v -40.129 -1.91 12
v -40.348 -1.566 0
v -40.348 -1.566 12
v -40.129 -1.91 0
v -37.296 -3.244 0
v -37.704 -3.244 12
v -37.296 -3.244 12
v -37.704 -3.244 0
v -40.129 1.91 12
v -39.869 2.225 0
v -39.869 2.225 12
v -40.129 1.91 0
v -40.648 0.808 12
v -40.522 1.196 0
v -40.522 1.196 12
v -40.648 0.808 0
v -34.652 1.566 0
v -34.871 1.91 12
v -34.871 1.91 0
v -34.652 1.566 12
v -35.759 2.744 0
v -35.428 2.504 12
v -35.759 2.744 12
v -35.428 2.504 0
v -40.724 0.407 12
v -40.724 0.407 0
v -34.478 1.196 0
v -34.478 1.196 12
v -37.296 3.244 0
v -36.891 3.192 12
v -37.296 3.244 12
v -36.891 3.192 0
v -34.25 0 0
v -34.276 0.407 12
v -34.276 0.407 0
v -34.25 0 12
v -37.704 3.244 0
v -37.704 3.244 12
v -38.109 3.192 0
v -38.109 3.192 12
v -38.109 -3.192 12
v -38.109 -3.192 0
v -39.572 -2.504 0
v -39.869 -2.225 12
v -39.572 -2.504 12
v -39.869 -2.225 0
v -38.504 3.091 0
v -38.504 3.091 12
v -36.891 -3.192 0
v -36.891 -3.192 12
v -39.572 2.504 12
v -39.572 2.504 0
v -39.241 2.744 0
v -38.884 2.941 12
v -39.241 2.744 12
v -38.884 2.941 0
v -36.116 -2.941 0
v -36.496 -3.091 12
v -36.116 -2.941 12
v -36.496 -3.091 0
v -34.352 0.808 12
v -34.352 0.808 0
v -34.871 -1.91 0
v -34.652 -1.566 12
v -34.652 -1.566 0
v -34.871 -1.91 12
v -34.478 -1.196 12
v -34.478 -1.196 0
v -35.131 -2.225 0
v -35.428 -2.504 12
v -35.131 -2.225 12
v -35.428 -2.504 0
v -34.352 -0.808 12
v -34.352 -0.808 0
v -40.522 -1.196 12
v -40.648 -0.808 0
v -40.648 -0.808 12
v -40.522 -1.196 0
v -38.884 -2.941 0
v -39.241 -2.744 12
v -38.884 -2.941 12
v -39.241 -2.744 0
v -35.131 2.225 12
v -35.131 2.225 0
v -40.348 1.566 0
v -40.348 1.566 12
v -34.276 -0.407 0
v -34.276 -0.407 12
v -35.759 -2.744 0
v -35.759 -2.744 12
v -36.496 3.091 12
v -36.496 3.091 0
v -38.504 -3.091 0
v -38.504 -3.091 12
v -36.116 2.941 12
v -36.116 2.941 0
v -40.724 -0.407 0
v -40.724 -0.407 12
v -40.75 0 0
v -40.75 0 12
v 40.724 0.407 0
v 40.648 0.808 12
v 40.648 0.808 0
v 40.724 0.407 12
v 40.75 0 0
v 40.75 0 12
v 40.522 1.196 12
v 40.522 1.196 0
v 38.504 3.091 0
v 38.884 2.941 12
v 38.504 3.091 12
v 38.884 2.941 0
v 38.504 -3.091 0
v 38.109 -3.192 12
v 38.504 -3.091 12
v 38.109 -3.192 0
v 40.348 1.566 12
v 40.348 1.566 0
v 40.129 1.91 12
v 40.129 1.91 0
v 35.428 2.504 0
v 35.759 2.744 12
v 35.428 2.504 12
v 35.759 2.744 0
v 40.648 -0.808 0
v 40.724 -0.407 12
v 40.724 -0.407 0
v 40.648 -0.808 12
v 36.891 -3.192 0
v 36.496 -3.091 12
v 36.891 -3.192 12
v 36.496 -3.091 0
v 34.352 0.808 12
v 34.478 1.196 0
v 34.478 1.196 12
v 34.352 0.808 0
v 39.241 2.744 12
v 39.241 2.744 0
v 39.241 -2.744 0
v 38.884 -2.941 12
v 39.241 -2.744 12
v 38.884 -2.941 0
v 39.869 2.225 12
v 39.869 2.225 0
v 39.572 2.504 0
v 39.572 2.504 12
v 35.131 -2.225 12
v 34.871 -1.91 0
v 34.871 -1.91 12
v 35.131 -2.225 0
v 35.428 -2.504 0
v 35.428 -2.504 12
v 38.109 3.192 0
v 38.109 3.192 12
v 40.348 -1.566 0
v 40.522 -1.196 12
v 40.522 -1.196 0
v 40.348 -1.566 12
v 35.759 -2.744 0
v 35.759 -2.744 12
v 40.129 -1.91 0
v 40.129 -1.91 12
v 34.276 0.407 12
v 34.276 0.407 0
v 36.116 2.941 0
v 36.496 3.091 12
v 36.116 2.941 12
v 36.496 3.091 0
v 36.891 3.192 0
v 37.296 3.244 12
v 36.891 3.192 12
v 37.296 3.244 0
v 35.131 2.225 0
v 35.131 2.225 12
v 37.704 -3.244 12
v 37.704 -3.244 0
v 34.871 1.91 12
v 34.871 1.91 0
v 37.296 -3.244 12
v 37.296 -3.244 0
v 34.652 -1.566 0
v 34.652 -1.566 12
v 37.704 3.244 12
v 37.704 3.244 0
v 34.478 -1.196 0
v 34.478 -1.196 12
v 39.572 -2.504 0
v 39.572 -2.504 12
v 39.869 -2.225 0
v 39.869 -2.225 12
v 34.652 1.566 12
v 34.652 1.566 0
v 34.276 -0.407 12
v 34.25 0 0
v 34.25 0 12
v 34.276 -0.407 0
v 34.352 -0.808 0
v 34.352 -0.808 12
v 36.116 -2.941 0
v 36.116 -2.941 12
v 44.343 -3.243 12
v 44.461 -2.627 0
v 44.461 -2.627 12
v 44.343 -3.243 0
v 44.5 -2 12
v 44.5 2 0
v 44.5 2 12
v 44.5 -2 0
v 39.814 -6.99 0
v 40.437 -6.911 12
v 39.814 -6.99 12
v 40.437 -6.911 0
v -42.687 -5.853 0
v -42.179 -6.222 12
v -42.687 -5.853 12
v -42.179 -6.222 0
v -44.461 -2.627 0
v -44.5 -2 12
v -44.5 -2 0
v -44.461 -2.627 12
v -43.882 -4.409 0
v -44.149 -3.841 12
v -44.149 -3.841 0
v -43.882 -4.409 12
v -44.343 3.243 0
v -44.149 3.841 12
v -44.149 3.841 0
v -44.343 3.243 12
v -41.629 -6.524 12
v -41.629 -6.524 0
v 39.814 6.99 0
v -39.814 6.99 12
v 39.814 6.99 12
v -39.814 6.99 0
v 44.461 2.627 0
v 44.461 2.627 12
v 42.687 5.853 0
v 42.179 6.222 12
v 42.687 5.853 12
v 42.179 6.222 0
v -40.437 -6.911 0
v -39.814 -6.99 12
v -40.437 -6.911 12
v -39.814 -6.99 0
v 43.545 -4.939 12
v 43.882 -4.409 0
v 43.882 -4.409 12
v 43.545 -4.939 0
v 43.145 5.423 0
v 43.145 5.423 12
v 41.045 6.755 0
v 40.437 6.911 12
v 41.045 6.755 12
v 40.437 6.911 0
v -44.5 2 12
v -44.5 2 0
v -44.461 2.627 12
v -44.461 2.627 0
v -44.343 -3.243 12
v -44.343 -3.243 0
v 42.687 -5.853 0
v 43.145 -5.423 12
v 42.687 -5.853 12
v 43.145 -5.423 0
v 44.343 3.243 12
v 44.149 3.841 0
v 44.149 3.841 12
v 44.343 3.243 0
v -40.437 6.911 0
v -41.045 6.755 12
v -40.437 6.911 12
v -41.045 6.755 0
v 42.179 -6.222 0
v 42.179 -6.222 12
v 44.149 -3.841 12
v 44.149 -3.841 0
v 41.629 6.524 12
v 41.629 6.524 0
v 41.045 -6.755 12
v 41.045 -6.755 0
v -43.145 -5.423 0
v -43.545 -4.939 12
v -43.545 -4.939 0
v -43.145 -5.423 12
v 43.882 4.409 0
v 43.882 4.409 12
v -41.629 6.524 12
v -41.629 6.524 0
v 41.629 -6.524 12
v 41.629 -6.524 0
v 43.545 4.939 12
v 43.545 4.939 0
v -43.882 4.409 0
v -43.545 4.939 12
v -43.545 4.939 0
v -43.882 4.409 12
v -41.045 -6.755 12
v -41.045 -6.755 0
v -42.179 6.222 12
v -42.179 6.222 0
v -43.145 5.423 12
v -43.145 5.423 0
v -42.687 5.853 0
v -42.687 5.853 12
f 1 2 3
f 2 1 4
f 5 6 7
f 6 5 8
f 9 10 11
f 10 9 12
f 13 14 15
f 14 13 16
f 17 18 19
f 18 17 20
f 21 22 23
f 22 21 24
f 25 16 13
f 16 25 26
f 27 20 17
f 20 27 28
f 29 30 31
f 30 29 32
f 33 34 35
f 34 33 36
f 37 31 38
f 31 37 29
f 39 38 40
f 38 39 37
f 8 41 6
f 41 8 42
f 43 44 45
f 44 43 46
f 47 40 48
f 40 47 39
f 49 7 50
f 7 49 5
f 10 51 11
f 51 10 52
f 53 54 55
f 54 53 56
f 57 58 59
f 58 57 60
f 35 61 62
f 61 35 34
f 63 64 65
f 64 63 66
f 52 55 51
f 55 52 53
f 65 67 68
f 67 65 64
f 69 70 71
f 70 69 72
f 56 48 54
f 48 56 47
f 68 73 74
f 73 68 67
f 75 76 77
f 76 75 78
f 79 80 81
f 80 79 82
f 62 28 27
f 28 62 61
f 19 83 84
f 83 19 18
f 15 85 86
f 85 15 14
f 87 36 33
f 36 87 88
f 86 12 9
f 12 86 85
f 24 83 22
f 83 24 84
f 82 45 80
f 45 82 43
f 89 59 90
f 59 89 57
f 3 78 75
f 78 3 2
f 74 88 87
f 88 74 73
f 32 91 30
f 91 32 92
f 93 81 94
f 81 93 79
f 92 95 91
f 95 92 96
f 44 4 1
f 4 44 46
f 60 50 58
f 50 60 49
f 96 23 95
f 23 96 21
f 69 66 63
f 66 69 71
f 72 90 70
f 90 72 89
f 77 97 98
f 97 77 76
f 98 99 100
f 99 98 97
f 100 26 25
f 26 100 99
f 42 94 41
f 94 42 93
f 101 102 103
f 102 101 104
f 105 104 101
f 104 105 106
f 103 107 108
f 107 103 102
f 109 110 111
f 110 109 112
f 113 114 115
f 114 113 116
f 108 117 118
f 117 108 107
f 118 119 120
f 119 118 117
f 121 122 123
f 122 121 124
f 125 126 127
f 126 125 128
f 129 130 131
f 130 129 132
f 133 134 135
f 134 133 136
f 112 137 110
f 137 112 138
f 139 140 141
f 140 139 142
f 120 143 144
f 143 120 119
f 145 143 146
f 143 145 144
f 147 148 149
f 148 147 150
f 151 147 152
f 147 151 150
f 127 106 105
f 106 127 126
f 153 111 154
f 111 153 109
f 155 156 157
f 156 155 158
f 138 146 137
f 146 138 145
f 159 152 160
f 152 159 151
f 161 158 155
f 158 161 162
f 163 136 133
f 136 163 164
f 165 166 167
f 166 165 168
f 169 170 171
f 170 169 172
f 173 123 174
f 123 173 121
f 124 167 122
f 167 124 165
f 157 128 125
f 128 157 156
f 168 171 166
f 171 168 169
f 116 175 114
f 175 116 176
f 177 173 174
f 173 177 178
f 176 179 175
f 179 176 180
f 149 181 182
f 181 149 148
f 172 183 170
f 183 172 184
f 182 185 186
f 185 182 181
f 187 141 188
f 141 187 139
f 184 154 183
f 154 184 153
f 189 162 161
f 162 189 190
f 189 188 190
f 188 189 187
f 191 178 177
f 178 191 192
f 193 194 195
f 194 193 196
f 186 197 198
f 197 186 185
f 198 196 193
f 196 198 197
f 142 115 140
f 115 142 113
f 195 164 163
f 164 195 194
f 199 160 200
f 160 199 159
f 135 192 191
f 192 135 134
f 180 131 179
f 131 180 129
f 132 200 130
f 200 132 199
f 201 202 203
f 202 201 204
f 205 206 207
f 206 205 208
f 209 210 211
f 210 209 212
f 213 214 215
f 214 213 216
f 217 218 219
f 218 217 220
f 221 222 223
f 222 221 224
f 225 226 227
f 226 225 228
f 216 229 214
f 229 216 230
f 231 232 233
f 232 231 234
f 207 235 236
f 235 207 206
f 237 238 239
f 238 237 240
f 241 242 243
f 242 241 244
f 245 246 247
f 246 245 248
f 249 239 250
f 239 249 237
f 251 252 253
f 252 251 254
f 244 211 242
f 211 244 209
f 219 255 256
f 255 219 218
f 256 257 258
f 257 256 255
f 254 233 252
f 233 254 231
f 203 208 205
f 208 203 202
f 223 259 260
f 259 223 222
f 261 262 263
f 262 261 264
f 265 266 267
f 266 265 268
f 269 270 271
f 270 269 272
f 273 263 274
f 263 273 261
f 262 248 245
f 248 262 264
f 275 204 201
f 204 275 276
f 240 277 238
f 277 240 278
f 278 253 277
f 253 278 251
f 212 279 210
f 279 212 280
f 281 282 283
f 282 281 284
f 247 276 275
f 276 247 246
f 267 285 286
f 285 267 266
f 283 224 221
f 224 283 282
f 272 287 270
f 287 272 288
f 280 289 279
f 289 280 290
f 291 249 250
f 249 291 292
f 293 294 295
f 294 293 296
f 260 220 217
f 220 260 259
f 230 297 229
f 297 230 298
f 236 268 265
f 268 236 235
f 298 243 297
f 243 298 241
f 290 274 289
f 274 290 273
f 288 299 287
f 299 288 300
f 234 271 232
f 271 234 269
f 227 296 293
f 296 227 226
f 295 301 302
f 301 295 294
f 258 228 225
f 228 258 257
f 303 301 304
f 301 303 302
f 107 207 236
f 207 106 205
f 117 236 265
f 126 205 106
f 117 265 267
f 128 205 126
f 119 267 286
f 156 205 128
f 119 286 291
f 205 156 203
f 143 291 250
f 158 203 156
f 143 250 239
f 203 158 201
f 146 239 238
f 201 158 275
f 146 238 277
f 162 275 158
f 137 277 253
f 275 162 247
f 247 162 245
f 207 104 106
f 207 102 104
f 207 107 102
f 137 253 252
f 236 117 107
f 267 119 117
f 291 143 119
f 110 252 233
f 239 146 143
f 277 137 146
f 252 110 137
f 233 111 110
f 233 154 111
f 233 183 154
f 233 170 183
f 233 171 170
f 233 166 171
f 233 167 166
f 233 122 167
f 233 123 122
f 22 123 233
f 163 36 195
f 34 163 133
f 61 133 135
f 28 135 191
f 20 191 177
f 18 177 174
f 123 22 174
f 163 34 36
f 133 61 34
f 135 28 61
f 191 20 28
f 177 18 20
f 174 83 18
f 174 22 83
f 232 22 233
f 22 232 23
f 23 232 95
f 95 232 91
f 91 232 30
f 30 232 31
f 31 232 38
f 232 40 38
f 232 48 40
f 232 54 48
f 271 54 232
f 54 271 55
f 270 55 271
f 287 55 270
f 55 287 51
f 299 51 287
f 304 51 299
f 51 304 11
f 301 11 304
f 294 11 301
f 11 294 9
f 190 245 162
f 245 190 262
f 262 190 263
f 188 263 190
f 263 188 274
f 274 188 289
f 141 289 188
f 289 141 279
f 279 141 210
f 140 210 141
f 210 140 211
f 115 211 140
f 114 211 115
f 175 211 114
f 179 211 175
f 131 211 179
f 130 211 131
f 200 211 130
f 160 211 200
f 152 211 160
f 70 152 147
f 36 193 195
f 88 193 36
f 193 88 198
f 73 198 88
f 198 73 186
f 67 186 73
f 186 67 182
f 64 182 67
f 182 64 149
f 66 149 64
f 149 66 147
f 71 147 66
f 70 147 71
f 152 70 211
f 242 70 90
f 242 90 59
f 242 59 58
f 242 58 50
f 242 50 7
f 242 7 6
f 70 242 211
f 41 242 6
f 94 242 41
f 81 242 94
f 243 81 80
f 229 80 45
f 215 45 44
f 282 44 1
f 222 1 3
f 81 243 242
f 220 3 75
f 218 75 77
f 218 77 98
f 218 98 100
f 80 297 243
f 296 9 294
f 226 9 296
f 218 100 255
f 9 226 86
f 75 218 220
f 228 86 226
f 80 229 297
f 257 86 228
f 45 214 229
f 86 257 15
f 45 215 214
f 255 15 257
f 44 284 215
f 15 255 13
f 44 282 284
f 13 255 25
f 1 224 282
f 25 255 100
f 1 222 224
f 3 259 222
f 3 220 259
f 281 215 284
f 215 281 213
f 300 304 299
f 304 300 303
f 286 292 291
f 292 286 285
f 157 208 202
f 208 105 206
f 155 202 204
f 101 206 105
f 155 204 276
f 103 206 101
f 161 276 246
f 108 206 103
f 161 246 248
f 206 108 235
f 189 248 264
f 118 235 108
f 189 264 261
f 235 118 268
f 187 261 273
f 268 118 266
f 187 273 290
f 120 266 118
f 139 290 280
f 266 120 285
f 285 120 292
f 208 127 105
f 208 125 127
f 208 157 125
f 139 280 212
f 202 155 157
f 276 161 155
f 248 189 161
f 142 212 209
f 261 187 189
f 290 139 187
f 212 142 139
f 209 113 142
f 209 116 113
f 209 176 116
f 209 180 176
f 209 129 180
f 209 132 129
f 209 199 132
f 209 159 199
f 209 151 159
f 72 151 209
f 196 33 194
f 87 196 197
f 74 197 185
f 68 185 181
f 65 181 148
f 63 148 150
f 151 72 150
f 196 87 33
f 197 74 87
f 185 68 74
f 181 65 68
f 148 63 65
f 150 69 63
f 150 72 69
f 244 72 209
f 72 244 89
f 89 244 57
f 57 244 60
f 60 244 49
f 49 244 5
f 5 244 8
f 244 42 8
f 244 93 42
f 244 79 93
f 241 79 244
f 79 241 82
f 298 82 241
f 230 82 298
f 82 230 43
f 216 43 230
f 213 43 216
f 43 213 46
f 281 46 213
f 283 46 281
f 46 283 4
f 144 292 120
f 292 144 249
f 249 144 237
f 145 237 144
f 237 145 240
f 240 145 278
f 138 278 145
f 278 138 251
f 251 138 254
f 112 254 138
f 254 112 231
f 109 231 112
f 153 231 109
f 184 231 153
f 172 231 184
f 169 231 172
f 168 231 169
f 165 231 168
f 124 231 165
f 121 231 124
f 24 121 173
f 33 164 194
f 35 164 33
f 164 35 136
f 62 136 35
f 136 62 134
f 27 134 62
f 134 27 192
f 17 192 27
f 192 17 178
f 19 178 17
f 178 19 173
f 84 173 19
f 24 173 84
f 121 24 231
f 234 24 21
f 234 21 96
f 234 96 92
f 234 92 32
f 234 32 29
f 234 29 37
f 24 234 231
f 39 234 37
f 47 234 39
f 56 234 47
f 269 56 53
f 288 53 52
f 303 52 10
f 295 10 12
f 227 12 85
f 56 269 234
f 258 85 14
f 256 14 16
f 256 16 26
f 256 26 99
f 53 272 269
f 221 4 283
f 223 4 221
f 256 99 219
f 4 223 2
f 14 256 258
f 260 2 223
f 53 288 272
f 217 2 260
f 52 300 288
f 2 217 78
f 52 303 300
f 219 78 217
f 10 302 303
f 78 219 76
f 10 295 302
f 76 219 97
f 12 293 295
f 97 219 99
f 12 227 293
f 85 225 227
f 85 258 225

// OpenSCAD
$fn = 50;


difference() {
	union() {
		hull() {
			translate(v = [-39.5000000000, 2.0000000000, 0]) {
				cylinder(h = 12, r = 5);
			}
			translate(v = [39.5000000000, 2.0000000000, 0]) {
				cylinder(h = 12, r = 5);
			}
			translate(v = [-39.5000000000, -2.0000000000, 0]) {
				cylinder(h = 12, r = 5);
			}
			translate(v = [39.5000000000, -2.0000000000, 0]) {
				cylinder(h = 12, r = 5);
			}
		}
	}
	union() {
		translate(v = [-37.5000000000, 0.0000000000, -100.0000000000]) {
			cylinder(h = 200, r = 3.2500000000);
		}
		translate(v = [-37.5000000000, 0.0000000000, -100.0000000000]) {
			cylinder(h = 200, r = 3.2500000000);
		}
		translate(v = [37.5000000000, 0.0000000000, -100.0000000000]) {
			cylinder(h = 200, r = 3.2500000000);
		}
		translate(v = [37.5000000000, 0.0000000000, -100.0000000000]) {
			cylinder(h = 200, r = 3.2500000000);
		}
	}
}
